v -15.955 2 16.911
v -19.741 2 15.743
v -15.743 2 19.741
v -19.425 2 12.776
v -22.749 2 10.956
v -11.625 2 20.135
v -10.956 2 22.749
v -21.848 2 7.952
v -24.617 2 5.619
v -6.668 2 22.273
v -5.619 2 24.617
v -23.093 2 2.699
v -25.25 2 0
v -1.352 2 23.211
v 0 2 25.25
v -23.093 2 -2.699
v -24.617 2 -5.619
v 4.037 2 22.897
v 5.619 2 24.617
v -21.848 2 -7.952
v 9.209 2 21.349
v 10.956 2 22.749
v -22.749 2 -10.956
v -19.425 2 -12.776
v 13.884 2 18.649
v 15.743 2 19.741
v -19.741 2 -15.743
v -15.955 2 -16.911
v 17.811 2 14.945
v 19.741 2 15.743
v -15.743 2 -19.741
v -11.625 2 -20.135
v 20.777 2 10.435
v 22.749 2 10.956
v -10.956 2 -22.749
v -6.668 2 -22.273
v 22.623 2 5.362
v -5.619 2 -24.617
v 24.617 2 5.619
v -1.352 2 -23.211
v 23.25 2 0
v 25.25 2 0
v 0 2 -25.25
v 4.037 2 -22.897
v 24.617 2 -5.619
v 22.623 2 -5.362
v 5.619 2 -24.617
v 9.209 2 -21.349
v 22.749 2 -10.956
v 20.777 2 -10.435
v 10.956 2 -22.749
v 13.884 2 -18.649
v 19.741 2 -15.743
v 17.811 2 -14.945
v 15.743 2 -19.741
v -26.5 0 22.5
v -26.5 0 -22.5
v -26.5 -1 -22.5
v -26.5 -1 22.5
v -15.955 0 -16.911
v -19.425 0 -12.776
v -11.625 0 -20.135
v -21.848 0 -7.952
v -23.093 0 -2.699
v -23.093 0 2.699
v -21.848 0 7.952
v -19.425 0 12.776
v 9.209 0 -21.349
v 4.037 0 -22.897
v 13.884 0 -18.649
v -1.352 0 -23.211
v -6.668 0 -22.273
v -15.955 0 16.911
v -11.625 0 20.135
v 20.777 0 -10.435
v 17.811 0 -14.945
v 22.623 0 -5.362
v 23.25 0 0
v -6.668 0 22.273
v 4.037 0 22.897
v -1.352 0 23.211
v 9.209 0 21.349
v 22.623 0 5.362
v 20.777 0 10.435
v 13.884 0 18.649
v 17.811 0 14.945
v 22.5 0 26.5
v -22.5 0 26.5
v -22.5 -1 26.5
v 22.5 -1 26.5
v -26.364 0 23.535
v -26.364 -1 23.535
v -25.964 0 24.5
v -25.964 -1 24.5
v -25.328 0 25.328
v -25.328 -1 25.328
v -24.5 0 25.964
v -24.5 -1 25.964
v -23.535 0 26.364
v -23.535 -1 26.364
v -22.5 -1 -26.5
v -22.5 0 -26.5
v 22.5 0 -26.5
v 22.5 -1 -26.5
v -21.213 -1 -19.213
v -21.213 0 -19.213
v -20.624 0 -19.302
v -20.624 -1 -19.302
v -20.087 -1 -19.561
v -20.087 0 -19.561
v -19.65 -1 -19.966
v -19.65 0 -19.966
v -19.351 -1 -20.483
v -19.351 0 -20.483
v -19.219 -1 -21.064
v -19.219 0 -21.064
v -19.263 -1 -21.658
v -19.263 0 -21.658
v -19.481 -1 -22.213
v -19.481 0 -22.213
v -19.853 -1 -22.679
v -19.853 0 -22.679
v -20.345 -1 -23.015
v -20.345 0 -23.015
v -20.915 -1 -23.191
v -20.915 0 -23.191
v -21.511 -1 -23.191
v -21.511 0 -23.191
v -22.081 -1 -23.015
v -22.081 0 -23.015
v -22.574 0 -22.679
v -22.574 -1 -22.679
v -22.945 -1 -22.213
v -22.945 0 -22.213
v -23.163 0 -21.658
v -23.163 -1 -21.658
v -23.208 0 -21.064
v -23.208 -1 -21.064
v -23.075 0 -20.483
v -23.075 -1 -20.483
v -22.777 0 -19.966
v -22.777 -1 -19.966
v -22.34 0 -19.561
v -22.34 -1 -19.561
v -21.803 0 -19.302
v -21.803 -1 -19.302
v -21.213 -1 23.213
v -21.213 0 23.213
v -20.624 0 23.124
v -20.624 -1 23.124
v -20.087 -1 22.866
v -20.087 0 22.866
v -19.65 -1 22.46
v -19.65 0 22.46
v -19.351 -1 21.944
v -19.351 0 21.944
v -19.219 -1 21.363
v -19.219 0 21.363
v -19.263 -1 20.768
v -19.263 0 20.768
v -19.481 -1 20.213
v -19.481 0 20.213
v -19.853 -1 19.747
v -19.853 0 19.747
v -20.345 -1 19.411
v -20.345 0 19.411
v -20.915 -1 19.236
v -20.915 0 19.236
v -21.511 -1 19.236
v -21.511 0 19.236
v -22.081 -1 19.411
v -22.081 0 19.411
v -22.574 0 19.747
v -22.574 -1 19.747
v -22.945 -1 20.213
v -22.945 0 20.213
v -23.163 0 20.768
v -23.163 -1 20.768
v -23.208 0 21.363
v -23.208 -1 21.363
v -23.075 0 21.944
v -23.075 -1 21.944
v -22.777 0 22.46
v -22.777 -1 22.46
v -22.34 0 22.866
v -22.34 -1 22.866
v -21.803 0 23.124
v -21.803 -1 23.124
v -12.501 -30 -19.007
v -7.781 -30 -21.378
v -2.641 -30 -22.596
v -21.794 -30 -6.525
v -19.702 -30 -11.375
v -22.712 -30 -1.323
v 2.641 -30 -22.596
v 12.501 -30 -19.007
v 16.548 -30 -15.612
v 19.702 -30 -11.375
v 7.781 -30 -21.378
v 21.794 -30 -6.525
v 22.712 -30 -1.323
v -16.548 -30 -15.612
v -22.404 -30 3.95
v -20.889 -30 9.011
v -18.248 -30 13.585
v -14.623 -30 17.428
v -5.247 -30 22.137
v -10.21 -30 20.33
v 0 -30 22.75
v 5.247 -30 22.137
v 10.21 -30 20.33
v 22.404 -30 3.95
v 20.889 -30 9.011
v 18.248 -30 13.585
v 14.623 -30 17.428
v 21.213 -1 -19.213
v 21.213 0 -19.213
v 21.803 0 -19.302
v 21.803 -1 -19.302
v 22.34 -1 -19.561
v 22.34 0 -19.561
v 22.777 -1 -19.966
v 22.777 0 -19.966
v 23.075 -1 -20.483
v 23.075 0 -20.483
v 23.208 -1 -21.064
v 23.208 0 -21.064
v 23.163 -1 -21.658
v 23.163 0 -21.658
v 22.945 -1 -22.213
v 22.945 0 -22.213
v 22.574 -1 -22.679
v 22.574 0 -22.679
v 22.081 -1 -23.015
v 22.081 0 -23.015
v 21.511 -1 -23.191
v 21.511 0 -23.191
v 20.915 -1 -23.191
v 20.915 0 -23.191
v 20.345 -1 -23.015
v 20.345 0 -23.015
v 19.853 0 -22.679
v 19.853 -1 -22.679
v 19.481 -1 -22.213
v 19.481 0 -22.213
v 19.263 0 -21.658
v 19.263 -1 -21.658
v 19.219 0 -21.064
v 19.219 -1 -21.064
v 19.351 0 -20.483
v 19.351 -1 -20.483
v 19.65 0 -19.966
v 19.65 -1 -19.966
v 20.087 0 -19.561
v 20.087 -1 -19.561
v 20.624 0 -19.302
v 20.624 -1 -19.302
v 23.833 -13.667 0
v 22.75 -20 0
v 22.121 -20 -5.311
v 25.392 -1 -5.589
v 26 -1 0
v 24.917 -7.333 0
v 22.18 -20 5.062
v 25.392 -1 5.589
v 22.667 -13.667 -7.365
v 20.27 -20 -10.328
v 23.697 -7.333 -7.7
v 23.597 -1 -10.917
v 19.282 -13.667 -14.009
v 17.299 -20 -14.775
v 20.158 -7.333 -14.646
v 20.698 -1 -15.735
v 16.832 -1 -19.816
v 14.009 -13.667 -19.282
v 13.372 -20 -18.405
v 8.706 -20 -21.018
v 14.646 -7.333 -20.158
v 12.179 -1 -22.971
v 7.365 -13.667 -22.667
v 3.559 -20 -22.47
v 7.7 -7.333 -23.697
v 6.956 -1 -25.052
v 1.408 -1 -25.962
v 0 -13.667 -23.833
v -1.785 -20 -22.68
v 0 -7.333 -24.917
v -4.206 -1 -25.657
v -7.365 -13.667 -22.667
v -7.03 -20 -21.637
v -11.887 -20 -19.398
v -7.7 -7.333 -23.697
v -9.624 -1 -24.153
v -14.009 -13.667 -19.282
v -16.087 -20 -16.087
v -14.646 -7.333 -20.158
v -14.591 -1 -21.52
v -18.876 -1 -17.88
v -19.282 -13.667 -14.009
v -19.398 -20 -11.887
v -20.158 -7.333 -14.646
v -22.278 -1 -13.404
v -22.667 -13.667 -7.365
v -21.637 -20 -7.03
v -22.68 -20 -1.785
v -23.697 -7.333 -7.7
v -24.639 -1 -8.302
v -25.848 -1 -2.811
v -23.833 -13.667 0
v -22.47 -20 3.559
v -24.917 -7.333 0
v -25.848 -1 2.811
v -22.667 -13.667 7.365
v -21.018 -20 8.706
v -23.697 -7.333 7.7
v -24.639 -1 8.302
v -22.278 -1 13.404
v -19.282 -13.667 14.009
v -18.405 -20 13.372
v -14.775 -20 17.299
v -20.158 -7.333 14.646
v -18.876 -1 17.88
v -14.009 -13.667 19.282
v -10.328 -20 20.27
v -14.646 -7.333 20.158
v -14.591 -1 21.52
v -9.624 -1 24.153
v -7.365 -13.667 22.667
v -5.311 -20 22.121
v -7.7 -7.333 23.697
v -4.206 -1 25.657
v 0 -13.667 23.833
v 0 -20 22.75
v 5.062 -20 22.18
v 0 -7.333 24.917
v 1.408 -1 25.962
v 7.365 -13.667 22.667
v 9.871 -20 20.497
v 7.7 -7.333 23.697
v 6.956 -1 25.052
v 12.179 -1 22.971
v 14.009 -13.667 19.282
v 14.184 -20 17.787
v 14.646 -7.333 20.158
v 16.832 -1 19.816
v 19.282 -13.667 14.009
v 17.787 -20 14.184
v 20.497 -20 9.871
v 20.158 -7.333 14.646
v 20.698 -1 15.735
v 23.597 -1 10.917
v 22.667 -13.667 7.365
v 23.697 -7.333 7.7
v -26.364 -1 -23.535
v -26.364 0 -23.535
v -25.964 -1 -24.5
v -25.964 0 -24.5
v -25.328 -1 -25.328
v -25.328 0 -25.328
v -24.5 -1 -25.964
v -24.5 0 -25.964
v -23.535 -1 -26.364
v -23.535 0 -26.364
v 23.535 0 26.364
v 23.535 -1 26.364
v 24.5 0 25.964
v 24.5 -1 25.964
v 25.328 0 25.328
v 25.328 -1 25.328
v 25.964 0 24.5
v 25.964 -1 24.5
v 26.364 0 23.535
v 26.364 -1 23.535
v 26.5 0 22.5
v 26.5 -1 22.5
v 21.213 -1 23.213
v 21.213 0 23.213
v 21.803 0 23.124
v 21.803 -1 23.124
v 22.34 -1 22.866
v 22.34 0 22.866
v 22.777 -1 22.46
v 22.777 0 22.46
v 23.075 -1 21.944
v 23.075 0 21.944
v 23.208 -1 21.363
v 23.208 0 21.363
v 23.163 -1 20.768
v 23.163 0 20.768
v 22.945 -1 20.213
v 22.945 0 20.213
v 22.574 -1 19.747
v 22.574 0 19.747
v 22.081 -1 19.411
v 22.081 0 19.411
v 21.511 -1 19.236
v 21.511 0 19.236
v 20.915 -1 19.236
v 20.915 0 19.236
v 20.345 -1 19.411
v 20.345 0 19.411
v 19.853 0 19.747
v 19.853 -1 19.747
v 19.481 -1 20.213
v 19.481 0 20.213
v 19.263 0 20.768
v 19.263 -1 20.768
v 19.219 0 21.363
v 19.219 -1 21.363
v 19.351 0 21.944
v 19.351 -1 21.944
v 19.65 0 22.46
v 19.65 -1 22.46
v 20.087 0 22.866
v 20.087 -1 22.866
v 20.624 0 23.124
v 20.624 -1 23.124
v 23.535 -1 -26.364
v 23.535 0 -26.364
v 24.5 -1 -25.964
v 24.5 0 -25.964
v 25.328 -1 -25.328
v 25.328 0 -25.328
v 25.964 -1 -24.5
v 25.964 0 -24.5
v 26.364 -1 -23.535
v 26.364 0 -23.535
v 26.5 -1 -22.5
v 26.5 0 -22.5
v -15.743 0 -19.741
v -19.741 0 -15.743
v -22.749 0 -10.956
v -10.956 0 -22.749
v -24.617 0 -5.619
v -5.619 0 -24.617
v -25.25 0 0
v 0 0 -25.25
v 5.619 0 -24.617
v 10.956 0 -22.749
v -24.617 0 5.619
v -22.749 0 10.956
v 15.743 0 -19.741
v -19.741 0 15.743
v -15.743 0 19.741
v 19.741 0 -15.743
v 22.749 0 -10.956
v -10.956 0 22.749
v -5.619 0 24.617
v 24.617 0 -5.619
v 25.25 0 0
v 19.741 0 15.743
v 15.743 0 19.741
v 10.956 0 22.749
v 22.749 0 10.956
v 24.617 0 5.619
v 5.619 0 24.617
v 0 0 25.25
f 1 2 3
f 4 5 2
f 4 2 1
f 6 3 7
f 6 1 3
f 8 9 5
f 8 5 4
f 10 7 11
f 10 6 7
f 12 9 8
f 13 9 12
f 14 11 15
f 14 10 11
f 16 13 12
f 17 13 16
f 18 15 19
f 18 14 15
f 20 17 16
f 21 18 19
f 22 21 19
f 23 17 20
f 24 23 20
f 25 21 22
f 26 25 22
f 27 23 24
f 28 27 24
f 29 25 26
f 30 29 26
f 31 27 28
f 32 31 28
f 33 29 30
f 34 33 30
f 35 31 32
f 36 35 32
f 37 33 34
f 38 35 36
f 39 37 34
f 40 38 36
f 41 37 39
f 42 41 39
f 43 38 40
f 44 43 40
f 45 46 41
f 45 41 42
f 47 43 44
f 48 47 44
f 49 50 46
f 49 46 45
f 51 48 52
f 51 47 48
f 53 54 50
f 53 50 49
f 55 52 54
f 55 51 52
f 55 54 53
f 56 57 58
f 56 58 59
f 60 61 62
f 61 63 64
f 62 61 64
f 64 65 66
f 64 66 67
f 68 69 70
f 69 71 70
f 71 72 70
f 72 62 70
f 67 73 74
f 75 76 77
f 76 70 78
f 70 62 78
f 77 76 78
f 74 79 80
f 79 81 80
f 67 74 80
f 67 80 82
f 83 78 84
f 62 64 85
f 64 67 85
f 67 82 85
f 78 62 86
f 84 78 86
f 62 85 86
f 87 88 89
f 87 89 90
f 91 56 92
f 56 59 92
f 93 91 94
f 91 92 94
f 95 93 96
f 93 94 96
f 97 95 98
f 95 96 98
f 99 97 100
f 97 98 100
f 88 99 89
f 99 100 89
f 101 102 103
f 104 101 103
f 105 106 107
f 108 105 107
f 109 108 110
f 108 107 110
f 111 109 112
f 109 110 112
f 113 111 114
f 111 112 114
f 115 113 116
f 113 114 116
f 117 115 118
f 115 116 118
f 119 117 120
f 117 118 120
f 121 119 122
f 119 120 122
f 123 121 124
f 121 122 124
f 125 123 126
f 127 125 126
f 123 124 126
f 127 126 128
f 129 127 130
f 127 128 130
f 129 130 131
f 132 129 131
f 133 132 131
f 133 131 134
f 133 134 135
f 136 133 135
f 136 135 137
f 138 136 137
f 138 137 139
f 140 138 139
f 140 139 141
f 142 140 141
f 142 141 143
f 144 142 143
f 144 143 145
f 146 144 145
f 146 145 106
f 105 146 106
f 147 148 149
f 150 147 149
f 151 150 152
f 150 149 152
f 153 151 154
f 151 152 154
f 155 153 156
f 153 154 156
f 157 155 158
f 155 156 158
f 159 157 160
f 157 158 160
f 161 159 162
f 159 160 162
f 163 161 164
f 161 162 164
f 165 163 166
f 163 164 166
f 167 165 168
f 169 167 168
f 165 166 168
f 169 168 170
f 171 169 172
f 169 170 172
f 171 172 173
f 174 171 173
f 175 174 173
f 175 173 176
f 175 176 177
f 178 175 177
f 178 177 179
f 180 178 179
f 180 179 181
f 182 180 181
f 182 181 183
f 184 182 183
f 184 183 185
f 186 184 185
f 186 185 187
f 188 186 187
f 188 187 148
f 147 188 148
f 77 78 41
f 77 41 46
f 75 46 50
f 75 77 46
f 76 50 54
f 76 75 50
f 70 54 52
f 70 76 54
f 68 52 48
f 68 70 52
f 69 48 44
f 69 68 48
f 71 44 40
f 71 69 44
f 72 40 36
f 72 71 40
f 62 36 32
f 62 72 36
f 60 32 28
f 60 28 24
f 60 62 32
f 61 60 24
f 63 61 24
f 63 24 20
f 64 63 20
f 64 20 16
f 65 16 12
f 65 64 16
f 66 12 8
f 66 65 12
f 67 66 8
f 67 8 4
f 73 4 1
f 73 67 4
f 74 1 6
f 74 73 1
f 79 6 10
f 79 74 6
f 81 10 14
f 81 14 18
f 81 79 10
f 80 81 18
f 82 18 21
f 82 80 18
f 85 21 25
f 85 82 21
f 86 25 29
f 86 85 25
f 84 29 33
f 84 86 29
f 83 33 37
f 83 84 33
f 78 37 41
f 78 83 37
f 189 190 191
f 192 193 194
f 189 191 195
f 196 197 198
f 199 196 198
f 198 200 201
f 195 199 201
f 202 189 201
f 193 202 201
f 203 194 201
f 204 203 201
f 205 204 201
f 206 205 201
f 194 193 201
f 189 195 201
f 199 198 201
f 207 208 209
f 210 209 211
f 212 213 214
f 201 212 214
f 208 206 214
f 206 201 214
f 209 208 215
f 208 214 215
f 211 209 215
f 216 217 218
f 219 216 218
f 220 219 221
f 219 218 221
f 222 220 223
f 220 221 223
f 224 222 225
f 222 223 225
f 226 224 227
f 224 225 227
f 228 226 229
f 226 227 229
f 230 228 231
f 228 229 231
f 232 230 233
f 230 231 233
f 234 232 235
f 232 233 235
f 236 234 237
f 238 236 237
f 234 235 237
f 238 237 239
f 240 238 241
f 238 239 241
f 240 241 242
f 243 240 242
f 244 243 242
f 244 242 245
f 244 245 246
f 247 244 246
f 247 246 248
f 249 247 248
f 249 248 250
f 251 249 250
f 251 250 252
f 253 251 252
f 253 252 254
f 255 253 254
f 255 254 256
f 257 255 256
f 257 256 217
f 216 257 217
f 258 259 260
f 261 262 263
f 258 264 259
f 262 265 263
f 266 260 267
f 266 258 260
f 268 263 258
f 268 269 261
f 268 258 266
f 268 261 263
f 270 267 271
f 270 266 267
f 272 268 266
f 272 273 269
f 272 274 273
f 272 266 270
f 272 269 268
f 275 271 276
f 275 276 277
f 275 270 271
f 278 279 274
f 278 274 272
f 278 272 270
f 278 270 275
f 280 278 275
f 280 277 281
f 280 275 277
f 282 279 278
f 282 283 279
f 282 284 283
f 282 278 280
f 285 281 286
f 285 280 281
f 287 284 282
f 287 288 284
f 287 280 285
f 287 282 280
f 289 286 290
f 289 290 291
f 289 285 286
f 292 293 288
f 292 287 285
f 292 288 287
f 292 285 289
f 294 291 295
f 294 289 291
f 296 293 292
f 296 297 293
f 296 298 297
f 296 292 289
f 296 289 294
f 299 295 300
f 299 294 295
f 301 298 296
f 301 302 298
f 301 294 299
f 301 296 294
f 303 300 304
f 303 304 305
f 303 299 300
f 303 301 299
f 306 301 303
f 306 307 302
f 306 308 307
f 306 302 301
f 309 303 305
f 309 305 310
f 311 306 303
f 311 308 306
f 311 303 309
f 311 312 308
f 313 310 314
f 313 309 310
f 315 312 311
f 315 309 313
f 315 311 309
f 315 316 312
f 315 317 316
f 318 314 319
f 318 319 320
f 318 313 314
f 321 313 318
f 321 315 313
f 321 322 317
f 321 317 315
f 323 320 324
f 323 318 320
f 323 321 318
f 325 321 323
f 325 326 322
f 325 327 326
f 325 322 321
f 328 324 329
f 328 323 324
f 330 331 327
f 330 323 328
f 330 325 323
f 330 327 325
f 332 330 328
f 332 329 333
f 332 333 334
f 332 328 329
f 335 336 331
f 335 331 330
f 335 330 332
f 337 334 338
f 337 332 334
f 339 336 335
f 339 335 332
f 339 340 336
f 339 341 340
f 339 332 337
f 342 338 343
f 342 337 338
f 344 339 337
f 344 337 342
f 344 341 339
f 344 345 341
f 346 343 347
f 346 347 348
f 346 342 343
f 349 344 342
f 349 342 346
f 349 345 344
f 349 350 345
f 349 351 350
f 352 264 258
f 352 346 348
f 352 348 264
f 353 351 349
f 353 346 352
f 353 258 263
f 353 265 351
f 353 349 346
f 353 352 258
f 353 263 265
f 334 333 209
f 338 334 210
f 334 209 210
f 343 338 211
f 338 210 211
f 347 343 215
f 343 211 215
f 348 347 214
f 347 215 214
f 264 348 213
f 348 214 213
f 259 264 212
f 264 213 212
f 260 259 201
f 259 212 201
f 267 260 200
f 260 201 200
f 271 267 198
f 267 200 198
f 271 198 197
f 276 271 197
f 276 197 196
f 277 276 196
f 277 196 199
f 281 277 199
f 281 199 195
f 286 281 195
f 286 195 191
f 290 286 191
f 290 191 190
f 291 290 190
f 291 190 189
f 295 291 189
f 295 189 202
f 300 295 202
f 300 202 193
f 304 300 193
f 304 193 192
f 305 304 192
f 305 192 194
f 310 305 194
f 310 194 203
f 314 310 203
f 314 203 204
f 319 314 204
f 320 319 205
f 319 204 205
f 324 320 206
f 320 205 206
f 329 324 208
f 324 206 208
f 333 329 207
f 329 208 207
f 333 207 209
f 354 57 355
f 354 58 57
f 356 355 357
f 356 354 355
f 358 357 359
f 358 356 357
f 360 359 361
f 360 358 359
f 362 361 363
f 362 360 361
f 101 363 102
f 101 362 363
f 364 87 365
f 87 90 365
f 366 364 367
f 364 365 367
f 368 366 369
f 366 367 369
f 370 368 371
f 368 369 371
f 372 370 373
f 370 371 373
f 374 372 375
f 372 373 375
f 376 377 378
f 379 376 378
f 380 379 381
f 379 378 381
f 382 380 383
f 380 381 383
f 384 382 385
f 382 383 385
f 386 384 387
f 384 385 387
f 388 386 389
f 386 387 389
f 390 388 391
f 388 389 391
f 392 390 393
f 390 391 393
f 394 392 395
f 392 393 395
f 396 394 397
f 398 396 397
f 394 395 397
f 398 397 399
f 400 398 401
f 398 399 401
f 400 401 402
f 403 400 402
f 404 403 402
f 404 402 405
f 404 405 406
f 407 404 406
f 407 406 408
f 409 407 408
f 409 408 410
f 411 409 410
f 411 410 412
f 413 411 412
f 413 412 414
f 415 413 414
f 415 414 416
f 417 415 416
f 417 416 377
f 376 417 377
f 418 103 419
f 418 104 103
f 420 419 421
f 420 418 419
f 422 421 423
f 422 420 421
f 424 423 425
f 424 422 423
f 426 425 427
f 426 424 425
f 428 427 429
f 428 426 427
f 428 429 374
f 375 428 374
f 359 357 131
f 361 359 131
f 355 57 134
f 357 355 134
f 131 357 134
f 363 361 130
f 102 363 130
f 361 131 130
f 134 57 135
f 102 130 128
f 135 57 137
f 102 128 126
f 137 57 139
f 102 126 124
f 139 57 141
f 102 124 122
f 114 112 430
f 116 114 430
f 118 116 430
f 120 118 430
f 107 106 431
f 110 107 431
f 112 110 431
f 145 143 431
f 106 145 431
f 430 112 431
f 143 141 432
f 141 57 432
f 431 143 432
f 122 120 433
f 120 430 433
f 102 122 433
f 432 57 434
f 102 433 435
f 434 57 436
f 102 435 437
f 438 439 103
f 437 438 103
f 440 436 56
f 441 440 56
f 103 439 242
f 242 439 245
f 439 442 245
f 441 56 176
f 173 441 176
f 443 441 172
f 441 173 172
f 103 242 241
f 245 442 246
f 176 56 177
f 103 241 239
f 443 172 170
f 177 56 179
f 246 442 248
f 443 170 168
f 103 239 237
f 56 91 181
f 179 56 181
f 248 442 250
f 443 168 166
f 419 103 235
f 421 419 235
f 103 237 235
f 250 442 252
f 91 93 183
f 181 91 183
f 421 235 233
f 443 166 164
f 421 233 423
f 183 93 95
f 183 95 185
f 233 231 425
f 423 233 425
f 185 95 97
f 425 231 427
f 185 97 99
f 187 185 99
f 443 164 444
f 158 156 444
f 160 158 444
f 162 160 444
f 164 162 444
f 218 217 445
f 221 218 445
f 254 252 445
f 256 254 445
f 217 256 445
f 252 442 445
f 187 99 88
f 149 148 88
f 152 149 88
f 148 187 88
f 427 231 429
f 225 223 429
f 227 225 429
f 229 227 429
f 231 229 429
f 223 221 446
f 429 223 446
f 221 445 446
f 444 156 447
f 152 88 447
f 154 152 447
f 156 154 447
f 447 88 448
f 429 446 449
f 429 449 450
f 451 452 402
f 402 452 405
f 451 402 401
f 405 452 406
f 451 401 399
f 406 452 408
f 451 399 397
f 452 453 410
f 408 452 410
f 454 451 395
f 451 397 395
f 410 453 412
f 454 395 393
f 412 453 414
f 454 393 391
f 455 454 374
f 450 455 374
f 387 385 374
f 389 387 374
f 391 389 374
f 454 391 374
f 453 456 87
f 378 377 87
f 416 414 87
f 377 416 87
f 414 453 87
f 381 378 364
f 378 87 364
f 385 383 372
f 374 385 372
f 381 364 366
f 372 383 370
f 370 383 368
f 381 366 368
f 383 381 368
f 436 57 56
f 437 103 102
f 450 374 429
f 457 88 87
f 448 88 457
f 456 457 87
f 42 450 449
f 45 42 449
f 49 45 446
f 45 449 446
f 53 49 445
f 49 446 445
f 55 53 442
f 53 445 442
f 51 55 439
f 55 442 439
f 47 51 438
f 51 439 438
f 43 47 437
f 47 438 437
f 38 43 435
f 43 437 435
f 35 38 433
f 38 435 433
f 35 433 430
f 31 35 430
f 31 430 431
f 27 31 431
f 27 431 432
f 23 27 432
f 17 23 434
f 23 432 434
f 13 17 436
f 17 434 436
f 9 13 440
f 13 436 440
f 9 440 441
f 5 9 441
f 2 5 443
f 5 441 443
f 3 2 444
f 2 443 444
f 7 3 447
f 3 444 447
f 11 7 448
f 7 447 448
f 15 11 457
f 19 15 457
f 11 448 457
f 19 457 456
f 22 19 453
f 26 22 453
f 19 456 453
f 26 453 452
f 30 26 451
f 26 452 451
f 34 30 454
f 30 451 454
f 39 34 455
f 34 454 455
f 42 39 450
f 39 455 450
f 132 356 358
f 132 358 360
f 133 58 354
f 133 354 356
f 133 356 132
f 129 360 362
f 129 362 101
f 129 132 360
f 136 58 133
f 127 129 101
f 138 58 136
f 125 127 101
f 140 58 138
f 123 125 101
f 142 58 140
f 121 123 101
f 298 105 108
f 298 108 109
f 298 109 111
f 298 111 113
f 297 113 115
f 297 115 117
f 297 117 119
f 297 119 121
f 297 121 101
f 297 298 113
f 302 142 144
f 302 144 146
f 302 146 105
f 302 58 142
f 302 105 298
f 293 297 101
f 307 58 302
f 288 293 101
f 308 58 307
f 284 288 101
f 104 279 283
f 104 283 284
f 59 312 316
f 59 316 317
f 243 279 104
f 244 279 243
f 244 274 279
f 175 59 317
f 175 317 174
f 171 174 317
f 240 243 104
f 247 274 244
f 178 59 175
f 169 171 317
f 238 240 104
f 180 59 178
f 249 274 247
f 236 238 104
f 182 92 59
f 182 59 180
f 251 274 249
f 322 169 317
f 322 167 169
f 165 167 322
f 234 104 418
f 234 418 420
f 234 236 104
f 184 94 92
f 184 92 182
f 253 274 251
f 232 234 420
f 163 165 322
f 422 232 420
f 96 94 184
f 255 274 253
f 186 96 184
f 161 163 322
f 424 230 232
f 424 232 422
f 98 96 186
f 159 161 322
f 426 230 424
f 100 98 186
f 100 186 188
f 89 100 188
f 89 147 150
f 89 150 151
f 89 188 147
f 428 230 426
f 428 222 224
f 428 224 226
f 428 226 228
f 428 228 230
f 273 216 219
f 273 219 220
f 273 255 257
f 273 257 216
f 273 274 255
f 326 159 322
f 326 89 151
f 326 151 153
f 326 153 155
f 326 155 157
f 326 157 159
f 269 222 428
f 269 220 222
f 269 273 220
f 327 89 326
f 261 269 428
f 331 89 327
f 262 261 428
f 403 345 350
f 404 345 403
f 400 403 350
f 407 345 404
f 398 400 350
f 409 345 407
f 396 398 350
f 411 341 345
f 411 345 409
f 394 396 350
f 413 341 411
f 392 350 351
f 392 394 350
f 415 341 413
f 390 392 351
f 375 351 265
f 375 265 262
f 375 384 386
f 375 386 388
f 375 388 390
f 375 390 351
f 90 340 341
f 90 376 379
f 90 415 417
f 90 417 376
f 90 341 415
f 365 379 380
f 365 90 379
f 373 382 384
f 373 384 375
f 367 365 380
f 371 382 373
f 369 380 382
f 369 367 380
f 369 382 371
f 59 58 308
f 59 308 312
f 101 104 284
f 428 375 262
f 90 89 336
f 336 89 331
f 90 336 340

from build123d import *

# Parameters (mm, degrees)
SKETCH_1_R          = 25.25
SKETCH_1_R_2        = 23.25
EXTRUDE_1_DEPTH     = 2
SKETCH_2_W          = 53
SKETCH_2_H          = 53
EXTRUDE_1_2_DEPTH   = 1
FILLET_1_R          = 4
SKETCH_3_R          = 22.75
EXTRUDE_2_DEPTH     = 10
SKETCH_5_R          = 2
CUT_EXTRUDE_1_DEPTH = 10


# Read off the part's stored shape, not the designer's step: 放样3
with BuildPart() as part:
    # 草图1 → Extrude 1 (new body)
    with BuildSketch(Plane(origin=(0, 0, 0), x_dir=(1, 0, 0), z_dir=(0, 1, 0))):
        Circle(SKETCH_1_R)
        Circle(SKETCH_1_R_2, mode=Mode.SUBTRACT)
    extrude(amount=EXTRUDE_1_DEPTH)

    # 草图2 → Extrude 1 2 (add)
    with BuildSketch(Plane.XZ):
        Rectangle(SKETCH_2_W, SKETCH_2_H)
    extrude(amount=EXTRUDE_1_2_DEPTH)

    # 圆角1
    fillet_1_edges = [part.edges().sort_by_distance(p)[0] for p in [
        (26.5, -0.5, 26.5),
        (-26.5, -0.5, 26.5),
        (-26.5, -0.5, -26.5),
        (26.5, -0.5, -26.5),
    ]]
    fillet(fillet_1_edges, radius=FILLET_1_R)



with BuildPart() as body_2:
    # 草图3 → 凸台-拉伸2 (new body)
    with BuildSketch(Plane(origin=(0, -30, 0), x_dir=(1, 0, 0), z_dir=(0, 1, 0))):
        with Locations(Location((0, 0, 0), (0, 0, 270))):
            Circle(SKETCH_3_R)
    extrude(amount=EXTRUDE_2_DEPTH)


with BuildPart() as part_1:
    add(part.part)

    add(body_2.part)  # 放样3 merges body 2
    # 放样3 outline → 放样3 (revolve)
    with BuildSketch(Plane.XY):
        Polygon((0, -20), (22.75, -20), (26, -1), (0, -1), align=None)
    revolve(axis=Axis((0, 0, 0), (0, 1, 0)))

    # 草图5 → 切除-拉伸1 (cut)
    with BuildSketch(Plane(origin=(0, 0, 0), x_dir=(1, 0, 0), z_dir=(0, 1, 0))):
        with Locations(Location((-21.213203436, 21.213203436, 0), (0, 0, 270))):
            Circle(SKETCH_5_R)
        with Locations(Location((-21.213203436, -21.213203436, 0), (0, 0, 270))):
            Circle(SKETCH_5_R)
        with Locations(Location((21.213203436, -21.213203436, 0), (0, 0, 270))):
            Circle(SKETCH_5_R)
        with Locations(Location((21.213203436, 21.213203436, 0), (0, 0, 270))):
            Circle(SKETCH_5_R)
    extrude(amount=-CUT_EXTRUDE_1_DEPTH, mode=Mode.SUBTRACT)


solid = part_1.part
